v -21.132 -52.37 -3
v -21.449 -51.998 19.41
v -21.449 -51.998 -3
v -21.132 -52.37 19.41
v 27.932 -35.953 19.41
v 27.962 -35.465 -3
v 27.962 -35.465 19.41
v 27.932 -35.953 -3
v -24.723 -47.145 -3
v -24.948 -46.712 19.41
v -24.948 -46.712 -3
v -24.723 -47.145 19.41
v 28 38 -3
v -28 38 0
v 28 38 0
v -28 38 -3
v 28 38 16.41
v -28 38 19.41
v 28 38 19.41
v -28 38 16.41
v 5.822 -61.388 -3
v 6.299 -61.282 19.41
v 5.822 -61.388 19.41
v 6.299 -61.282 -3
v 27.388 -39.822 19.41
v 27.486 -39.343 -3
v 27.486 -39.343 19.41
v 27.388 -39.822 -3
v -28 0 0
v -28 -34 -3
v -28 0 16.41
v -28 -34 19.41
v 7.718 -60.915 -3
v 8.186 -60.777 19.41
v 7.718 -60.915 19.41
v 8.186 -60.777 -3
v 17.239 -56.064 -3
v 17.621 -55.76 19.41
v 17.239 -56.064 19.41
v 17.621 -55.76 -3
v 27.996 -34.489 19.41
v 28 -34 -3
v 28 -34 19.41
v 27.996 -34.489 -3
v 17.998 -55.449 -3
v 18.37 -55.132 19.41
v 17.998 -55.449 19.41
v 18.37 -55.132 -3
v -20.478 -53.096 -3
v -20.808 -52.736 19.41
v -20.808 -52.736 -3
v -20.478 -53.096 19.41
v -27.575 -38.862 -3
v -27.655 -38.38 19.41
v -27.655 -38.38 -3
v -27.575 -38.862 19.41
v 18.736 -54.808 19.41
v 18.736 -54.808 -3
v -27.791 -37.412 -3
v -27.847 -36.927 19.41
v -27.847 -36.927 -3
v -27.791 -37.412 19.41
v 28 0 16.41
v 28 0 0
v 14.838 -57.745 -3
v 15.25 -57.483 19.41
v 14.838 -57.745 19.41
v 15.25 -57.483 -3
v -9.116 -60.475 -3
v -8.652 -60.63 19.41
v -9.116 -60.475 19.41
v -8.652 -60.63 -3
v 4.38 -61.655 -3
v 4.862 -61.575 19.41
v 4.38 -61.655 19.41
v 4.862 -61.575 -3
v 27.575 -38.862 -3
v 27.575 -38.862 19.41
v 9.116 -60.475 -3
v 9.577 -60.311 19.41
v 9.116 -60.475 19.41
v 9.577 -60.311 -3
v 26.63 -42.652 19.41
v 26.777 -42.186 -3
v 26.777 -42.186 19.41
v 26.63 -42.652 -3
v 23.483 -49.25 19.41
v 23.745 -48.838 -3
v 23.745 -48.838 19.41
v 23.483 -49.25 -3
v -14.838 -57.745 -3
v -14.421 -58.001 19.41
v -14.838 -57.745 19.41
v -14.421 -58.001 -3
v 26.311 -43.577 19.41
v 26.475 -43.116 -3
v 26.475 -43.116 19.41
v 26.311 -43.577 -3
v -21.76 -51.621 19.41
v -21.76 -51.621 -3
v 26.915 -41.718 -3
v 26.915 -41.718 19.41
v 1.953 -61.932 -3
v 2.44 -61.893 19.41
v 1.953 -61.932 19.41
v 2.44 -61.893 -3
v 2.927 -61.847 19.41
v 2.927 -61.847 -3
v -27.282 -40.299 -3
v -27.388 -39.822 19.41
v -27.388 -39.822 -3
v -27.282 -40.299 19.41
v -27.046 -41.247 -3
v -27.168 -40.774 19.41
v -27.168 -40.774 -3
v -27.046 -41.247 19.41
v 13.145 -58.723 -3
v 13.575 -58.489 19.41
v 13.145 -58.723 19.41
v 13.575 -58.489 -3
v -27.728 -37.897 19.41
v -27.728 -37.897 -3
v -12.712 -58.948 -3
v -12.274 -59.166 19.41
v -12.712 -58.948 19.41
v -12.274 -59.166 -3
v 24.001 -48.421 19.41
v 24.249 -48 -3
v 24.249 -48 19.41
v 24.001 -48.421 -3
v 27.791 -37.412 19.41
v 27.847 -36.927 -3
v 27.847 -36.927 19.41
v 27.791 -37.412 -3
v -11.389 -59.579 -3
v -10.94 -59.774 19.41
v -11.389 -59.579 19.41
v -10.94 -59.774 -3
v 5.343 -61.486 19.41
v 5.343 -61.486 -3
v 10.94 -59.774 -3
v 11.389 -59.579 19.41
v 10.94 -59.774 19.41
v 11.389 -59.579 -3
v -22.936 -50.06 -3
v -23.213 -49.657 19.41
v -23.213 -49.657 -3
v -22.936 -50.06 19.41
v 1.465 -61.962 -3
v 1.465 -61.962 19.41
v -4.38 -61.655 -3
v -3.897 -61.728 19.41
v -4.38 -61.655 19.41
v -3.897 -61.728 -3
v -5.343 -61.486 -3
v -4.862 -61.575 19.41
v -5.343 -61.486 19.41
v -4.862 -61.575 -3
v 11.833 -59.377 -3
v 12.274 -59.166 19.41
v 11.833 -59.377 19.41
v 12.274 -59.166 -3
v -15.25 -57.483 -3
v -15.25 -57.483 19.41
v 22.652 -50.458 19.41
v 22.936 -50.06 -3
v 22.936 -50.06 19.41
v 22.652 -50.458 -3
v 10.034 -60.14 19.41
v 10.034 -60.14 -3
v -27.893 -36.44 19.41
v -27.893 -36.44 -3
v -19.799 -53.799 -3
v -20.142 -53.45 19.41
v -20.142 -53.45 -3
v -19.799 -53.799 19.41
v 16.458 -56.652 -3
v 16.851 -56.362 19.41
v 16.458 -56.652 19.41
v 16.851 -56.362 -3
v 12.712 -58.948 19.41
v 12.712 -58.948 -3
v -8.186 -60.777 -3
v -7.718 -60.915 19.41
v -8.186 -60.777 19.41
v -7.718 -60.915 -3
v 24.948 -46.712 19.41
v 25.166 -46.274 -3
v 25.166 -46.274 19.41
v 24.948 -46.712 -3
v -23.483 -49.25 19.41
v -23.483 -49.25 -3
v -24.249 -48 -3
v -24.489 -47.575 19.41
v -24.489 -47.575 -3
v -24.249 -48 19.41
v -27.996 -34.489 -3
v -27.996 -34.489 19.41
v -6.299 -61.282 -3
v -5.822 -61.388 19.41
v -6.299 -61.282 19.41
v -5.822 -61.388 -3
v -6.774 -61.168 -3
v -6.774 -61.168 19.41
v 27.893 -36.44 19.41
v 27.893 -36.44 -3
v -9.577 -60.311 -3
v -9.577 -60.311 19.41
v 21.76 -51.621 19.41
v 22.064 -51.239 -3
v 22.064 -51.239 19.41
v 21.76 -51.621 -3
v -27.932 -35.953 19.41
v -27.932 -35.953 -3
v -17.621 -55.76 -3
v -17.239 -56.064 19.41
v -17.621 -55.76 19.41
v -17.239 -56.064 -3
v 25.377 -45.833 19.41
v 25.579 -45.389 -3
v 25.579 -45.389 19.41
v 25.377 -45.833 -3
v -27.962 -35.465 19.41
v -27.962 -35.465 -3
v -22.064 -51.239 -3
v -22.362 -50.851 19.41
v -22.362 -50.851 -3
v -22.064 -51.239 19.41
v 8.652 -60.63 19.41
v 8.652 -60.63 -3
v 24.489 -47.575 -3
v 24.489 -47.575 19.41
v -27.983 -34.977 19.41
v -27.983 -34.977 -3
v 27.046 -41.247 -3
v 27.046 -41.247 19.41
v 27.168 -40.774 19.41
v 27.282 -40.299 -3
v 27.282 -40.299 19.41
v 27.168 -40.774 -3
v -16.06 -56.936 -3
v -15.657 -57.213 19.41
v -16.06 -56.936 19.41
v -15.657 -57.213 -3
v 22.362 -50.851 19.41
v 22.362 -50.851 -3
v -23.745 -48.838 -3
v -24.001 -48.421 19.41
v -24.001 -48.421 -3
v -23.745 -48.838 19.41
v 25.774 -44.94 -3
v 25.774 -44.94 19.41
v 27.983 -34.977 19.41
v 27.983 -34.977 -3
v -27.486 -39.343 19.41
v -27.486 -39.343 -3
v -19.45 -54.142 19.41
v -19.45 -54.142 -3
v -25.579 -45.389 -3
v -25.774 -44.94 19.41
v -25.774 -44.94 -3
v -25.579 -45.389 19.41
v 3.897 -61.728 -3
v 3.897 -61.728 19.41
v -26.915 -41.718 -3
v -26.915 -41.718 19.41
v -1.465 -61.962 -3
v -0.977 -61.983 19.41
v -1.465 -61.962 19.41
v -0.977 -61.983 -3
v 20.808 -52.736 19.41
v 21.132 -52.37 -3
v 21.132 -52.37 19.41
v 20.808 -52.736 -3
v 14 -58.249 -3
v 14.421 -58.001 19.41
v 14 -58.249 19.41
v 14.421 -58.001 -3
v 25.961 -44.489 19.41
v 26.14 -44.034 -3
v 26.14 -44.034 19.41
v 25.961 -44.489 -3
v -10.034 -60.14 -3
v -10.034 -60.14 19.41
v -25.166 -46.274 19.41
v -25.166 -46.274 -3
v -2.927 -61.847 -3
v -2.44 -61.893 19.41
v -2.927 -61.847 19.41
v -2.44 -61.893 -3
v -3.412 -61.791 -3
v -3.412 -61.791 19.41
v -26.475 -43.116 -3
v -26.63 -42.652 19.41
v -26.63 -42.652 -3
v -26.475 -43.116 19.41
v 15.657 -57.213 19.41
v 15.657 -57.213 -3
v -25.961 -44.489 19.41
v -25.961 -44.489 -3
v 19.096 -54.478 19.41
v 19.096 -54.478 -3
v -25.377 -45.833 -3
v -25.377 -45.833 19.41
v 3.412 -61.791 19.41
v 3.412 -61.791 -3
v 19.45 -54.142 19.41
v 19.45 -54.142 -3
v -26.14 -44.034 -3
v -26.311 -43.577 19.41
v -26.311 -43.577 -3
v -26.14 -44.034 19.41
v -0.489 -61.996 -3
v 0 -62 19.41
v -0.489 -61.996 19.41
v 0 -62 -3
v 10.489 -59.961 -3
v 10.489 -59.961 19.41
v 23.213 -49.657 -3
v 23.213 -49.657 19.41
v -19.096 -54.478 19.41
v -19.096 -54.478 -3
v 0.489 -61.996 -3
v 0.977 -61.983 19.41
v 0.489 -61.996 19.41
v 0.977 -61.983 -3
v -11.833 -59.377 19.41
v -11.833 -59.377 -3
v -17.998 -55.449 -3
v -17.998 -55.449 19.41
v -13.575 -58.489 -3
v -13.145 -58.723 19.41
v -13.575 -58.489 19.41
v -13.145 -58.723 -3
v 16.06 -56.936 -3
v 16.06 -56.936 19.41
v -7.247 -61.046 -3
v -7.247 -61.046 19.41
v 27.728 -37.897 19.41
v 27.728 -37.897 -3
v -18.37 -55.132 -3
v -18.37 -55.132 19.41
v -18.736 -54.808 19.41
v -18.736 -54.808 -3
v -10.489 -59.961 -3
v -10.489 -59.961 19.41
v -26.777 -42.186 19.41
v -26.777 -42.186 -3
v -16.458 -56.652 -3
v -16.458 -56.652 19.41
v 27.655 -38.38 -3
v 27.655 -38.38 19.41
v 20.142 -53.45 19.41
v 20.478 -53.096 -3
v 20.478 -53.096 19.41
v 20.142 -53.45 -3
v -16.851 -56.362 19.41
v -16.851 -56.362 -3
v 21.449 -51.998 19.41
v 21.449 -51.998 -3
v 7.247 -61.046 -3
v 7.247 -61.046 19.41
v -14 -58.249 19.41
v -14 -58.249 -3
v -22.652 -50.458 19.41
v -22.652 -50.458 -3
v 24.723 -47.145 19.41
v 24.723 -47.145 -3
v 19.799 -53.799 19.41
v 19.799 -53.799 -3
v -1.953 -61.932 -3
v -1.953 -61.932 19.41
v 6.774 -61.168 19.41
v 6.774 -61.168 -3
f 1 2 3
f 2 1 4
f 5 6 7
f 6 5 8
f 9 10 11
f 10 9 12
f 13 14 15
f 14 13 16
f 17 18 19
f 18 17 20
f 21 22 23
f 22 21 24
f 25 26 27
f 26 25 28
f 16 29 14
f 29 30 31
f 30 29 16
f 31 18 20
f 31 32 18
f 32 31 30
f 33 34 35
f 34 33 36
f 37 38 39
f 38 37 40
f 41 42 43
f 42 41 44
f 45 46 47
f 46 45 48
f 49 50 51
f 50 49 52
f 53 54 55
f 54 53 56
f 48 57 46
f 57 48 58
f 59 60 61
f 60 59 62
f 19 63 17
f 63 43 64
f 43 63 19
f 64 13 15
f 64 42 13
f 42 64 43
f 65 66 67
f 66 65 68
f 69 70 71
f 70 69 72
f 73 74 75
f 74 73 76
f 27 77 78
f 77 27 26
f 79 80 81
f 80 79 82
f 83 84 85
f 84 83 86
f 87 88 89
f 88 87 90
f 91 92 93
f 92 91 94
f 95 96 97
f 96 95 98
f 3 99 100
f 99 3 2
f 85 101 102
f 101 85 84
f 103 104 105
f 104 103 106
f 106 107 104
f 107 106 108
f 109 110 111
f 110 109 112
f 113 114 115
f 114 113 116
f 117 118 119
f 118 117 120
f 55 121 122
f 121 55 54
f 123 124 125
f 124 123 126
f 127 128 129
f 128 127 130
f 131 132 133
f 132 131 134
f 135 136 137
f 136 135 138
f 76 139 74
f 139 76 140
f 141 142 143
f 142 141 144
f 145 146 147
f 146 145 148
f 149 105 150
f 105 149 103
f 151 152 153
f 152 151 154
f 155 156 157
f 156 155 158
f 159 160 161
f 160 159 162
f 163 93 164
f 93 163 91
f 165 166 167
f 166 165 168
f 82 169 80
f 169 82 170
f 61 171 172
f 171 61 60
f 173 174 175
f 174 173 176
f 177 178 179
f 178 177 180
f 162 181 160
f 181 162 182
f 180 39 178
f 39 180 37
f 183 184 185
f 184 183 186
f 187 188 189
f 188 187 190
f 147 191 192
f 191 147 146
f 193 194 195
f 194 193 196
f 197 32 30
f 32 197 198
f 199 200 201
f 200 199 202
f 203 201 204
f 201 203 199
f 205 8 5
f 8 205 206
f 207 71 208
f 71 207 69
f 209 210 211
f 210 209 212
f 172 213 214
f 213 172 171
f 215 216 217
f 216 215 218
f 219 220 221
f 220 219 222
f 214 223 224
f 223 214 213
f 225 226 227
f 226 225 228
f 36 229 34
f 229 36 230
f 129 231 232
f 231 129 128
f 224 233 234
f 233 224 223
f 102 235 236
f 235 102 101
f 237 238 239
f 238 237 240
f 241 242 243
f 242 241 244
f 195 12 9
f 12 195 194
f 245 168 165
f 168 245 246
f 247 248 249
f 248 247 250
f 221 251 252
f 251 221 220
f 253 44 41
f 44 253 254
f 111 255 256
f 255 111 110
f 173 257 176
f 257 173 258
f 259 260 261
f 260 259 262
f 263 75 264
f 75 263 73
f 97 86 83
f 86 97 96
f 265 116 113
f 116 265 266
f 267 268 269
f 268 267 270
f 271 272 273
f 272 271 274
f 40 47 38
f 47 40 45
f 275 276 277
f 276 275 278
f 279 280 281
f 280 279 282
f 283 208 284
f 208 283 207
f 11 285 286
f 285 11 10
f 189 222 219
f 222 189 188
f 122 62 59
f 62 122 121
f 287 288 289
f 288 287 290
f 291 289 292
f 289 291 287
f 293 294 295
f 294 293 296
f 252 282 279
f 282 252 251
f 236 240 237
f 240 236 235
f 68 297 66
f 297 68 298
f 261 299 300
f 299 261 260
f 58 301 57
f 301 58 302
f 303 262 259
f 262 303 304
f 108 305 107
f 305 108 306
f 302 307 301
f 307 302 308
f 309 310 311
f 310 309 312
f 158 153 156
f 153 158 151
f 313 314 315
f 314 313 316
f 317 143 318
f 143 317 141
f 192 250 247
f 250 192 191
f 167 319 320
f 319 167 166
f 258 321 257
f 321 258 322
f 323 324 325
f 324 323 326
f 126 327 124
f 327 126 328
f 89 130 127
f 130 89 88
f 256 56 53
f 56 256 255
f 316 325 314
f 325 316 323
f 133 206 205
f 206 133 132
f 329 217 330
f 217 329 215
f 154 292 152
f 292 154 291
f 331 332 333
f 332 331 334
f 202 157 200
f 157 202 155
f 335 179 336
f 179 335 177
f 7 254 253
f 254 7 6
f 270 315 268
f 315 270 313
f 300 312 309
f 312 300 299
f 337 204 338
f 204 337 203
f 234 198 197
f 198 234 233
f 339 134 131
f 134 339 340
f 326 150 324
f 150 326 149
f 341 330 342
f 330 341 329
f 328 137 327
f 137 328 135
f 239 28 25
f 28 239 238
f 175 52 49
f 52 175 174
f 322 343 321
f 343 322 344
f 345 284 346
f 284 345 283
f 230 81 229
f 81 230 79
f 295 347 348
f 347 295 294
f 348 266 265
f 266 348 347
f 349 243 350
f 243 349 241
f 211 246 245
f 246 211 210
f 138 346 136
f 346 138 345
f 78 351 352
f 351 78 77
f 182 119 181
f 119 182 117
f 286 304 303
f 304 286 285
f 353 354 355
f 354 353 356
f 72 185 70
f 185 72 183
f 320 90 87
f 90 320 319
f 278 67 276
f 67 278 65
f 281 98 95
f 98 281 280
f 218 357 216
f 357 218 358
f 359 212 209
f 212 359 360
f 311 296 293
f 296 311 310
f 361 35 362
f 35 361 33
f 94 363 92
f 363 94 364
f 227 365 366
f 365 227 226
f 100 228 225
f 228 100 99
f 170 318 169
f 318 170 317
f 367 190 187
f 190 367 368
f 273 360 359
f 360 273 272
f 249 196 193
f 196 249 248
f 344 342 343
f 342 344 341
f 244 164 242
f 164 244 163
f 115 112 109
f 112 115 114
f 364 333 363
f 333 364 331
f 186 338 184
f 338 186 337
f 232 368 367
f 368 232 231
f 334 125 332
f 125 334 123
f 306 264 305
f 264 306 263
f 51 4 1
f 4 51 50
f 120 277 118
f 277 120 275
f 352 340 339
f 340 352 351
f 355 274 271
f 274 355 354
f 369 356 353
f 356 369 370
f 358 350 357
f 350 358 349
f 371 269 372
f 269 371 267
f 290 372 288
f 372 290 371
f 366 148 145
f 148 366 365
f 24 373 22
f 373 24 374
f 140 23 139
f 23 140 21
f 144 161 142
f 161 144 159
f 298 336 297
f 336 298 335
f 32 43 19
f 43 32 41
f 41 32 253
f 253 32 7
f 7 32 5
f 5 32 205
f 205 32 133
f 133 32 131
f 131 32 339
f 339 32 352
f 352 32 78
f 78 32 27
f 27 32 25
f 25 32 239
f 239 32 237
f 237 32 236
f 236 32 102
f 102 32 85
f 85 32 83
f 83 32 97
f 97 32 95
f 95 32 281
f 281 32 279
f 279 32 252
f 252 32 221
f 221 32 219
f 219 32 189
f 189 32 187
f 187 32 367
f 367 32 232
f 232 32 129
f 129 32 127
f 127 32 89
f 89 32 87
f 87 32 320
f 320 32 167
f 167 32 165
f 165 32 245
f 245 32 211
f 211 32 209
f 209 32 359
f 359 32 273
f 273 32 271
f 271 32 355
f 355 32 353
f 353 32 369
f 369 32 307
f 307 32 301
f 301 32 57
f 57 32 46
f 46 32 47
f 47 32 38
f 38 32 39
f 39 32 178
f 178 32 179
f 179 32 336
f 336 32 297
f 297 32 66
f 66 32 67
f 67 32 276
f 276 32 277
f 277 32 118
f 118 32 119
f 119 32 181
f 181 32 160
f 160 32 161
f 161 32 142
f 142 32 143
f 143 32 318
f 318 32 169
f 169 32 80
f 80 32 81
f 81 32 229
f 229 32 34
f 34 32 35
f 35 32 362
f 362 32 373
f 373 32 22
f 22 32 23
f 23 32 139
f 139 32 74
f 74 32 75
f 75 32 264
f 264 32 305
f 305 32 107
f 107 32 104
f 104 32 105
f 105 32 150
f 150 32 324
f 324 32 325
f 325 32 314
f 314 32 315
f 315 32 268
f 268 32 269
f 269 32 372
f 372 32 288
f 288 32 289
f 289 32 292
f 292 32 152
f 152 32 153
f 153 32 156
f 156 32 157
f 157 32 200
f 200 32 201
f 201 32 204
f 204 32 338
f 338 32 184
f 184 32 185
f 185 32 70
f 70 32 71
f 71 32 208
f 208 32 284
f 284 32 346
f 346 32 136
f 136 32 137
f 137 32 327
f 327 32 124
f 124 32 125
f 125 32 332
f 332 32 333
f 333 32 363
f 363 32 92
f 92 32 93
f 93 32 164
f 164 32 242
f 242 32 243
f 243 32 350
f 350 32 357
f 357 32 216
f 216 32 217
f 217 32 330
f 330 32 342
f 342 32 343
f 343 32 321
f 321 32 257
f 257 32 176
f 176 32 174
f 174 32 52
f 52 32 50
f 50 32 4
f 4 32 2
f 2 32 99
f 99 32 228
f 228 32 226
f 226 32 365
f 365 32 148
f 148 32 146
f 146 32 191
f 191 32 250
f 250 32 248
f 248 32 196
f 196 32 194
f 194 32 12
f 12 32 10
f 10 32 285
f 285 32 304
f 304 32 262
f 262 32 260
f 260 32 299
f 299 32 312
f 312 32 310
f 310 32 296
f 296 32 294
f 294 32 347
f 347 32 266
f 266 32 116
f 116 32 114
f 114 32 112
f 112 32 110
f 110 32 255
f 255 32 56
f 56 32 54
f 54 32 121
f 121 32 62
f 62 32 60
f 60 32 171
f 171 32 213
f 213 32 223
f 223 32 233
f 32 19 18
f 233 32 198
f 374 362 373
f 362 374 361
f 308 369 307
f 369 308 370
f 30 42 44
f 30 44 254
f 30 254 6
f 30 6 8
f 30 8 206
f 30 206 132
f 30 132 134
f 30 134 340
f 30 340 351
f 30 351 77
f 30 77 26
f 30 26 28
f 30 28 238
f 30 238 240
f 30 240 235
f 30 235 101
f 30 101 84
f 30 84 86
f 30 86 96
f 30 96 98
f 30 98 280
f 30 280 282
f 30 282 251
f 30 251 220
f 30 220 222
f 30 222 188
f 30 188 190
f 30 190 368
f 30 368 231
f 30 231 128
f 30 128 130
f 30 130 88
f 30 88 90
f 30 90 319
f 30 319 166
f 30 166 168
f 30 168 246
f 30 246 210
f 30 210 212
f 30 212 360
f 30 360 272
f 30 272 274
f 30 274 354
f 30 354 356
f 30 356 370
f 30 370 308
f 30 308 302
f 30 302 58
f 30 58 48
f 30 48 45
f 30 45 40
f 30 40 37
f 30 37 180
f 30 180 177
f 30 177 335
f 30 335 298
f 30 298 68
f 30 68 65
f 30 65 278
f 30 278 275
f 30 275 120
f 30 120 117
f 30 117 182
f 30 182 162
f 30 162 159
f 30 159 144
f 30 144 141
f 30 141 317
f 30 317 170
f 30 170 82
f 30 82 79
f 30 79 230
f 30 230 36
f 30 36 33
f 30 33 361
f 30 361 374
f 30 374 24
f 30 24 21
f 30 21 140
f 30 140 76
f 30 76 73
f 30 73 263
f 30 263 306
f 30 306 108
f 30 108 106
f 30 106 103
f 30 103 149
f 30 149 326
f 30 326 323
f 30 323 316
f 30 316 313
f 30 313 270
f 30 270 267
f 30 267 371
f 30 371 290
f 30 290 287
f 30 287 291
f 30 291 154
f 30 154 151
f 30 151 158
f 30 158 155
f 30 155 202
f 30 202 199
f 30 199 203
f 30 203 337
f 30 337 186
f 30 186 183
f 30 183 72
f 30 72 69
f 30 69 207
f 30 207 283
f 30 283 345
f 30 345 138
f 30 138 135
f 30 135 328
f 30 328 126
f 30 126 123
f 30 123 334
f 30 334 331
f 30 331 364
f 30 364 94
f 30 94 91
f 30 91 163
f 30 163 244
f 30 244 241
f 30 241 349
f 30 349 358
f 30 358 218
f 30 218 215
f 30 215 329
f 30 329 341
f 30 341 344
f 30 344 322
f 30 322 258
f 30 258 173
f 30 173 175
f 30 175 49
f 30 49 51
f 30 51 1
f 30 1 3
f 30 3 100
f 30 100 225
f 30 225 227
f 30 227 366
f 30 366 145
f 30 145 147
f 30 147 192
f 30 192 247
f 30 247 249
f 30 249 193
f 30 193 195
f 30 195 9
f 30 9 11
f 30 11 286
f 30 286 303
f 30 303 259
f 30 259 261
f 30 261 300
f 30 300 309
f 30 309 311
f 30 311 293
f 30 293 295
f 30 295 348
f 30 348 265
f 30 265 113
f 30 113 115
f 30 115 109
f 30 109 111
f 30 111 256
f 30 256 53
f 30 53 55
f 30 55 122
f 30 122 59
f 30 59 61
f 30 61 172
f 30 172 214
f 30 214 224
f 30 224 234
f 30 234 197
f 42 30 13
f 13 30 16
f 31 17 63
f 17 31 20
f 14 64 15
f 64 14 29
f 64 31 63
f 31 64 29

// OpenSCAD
$fn=360;
h=16.41;
module shelf() {
    translate([-500,0,0]) color("white") cube([1000,1000,h]);
}

module extension() {
    hull() {
        translate([0,-6-56/2,-3]) cylinder(d=56,h+6);
        translate([0,10,(h+6)/2-3]) cube([56,56,h+6], center=true);
    }
}

difference() {
    extension();
    shelf();
}
